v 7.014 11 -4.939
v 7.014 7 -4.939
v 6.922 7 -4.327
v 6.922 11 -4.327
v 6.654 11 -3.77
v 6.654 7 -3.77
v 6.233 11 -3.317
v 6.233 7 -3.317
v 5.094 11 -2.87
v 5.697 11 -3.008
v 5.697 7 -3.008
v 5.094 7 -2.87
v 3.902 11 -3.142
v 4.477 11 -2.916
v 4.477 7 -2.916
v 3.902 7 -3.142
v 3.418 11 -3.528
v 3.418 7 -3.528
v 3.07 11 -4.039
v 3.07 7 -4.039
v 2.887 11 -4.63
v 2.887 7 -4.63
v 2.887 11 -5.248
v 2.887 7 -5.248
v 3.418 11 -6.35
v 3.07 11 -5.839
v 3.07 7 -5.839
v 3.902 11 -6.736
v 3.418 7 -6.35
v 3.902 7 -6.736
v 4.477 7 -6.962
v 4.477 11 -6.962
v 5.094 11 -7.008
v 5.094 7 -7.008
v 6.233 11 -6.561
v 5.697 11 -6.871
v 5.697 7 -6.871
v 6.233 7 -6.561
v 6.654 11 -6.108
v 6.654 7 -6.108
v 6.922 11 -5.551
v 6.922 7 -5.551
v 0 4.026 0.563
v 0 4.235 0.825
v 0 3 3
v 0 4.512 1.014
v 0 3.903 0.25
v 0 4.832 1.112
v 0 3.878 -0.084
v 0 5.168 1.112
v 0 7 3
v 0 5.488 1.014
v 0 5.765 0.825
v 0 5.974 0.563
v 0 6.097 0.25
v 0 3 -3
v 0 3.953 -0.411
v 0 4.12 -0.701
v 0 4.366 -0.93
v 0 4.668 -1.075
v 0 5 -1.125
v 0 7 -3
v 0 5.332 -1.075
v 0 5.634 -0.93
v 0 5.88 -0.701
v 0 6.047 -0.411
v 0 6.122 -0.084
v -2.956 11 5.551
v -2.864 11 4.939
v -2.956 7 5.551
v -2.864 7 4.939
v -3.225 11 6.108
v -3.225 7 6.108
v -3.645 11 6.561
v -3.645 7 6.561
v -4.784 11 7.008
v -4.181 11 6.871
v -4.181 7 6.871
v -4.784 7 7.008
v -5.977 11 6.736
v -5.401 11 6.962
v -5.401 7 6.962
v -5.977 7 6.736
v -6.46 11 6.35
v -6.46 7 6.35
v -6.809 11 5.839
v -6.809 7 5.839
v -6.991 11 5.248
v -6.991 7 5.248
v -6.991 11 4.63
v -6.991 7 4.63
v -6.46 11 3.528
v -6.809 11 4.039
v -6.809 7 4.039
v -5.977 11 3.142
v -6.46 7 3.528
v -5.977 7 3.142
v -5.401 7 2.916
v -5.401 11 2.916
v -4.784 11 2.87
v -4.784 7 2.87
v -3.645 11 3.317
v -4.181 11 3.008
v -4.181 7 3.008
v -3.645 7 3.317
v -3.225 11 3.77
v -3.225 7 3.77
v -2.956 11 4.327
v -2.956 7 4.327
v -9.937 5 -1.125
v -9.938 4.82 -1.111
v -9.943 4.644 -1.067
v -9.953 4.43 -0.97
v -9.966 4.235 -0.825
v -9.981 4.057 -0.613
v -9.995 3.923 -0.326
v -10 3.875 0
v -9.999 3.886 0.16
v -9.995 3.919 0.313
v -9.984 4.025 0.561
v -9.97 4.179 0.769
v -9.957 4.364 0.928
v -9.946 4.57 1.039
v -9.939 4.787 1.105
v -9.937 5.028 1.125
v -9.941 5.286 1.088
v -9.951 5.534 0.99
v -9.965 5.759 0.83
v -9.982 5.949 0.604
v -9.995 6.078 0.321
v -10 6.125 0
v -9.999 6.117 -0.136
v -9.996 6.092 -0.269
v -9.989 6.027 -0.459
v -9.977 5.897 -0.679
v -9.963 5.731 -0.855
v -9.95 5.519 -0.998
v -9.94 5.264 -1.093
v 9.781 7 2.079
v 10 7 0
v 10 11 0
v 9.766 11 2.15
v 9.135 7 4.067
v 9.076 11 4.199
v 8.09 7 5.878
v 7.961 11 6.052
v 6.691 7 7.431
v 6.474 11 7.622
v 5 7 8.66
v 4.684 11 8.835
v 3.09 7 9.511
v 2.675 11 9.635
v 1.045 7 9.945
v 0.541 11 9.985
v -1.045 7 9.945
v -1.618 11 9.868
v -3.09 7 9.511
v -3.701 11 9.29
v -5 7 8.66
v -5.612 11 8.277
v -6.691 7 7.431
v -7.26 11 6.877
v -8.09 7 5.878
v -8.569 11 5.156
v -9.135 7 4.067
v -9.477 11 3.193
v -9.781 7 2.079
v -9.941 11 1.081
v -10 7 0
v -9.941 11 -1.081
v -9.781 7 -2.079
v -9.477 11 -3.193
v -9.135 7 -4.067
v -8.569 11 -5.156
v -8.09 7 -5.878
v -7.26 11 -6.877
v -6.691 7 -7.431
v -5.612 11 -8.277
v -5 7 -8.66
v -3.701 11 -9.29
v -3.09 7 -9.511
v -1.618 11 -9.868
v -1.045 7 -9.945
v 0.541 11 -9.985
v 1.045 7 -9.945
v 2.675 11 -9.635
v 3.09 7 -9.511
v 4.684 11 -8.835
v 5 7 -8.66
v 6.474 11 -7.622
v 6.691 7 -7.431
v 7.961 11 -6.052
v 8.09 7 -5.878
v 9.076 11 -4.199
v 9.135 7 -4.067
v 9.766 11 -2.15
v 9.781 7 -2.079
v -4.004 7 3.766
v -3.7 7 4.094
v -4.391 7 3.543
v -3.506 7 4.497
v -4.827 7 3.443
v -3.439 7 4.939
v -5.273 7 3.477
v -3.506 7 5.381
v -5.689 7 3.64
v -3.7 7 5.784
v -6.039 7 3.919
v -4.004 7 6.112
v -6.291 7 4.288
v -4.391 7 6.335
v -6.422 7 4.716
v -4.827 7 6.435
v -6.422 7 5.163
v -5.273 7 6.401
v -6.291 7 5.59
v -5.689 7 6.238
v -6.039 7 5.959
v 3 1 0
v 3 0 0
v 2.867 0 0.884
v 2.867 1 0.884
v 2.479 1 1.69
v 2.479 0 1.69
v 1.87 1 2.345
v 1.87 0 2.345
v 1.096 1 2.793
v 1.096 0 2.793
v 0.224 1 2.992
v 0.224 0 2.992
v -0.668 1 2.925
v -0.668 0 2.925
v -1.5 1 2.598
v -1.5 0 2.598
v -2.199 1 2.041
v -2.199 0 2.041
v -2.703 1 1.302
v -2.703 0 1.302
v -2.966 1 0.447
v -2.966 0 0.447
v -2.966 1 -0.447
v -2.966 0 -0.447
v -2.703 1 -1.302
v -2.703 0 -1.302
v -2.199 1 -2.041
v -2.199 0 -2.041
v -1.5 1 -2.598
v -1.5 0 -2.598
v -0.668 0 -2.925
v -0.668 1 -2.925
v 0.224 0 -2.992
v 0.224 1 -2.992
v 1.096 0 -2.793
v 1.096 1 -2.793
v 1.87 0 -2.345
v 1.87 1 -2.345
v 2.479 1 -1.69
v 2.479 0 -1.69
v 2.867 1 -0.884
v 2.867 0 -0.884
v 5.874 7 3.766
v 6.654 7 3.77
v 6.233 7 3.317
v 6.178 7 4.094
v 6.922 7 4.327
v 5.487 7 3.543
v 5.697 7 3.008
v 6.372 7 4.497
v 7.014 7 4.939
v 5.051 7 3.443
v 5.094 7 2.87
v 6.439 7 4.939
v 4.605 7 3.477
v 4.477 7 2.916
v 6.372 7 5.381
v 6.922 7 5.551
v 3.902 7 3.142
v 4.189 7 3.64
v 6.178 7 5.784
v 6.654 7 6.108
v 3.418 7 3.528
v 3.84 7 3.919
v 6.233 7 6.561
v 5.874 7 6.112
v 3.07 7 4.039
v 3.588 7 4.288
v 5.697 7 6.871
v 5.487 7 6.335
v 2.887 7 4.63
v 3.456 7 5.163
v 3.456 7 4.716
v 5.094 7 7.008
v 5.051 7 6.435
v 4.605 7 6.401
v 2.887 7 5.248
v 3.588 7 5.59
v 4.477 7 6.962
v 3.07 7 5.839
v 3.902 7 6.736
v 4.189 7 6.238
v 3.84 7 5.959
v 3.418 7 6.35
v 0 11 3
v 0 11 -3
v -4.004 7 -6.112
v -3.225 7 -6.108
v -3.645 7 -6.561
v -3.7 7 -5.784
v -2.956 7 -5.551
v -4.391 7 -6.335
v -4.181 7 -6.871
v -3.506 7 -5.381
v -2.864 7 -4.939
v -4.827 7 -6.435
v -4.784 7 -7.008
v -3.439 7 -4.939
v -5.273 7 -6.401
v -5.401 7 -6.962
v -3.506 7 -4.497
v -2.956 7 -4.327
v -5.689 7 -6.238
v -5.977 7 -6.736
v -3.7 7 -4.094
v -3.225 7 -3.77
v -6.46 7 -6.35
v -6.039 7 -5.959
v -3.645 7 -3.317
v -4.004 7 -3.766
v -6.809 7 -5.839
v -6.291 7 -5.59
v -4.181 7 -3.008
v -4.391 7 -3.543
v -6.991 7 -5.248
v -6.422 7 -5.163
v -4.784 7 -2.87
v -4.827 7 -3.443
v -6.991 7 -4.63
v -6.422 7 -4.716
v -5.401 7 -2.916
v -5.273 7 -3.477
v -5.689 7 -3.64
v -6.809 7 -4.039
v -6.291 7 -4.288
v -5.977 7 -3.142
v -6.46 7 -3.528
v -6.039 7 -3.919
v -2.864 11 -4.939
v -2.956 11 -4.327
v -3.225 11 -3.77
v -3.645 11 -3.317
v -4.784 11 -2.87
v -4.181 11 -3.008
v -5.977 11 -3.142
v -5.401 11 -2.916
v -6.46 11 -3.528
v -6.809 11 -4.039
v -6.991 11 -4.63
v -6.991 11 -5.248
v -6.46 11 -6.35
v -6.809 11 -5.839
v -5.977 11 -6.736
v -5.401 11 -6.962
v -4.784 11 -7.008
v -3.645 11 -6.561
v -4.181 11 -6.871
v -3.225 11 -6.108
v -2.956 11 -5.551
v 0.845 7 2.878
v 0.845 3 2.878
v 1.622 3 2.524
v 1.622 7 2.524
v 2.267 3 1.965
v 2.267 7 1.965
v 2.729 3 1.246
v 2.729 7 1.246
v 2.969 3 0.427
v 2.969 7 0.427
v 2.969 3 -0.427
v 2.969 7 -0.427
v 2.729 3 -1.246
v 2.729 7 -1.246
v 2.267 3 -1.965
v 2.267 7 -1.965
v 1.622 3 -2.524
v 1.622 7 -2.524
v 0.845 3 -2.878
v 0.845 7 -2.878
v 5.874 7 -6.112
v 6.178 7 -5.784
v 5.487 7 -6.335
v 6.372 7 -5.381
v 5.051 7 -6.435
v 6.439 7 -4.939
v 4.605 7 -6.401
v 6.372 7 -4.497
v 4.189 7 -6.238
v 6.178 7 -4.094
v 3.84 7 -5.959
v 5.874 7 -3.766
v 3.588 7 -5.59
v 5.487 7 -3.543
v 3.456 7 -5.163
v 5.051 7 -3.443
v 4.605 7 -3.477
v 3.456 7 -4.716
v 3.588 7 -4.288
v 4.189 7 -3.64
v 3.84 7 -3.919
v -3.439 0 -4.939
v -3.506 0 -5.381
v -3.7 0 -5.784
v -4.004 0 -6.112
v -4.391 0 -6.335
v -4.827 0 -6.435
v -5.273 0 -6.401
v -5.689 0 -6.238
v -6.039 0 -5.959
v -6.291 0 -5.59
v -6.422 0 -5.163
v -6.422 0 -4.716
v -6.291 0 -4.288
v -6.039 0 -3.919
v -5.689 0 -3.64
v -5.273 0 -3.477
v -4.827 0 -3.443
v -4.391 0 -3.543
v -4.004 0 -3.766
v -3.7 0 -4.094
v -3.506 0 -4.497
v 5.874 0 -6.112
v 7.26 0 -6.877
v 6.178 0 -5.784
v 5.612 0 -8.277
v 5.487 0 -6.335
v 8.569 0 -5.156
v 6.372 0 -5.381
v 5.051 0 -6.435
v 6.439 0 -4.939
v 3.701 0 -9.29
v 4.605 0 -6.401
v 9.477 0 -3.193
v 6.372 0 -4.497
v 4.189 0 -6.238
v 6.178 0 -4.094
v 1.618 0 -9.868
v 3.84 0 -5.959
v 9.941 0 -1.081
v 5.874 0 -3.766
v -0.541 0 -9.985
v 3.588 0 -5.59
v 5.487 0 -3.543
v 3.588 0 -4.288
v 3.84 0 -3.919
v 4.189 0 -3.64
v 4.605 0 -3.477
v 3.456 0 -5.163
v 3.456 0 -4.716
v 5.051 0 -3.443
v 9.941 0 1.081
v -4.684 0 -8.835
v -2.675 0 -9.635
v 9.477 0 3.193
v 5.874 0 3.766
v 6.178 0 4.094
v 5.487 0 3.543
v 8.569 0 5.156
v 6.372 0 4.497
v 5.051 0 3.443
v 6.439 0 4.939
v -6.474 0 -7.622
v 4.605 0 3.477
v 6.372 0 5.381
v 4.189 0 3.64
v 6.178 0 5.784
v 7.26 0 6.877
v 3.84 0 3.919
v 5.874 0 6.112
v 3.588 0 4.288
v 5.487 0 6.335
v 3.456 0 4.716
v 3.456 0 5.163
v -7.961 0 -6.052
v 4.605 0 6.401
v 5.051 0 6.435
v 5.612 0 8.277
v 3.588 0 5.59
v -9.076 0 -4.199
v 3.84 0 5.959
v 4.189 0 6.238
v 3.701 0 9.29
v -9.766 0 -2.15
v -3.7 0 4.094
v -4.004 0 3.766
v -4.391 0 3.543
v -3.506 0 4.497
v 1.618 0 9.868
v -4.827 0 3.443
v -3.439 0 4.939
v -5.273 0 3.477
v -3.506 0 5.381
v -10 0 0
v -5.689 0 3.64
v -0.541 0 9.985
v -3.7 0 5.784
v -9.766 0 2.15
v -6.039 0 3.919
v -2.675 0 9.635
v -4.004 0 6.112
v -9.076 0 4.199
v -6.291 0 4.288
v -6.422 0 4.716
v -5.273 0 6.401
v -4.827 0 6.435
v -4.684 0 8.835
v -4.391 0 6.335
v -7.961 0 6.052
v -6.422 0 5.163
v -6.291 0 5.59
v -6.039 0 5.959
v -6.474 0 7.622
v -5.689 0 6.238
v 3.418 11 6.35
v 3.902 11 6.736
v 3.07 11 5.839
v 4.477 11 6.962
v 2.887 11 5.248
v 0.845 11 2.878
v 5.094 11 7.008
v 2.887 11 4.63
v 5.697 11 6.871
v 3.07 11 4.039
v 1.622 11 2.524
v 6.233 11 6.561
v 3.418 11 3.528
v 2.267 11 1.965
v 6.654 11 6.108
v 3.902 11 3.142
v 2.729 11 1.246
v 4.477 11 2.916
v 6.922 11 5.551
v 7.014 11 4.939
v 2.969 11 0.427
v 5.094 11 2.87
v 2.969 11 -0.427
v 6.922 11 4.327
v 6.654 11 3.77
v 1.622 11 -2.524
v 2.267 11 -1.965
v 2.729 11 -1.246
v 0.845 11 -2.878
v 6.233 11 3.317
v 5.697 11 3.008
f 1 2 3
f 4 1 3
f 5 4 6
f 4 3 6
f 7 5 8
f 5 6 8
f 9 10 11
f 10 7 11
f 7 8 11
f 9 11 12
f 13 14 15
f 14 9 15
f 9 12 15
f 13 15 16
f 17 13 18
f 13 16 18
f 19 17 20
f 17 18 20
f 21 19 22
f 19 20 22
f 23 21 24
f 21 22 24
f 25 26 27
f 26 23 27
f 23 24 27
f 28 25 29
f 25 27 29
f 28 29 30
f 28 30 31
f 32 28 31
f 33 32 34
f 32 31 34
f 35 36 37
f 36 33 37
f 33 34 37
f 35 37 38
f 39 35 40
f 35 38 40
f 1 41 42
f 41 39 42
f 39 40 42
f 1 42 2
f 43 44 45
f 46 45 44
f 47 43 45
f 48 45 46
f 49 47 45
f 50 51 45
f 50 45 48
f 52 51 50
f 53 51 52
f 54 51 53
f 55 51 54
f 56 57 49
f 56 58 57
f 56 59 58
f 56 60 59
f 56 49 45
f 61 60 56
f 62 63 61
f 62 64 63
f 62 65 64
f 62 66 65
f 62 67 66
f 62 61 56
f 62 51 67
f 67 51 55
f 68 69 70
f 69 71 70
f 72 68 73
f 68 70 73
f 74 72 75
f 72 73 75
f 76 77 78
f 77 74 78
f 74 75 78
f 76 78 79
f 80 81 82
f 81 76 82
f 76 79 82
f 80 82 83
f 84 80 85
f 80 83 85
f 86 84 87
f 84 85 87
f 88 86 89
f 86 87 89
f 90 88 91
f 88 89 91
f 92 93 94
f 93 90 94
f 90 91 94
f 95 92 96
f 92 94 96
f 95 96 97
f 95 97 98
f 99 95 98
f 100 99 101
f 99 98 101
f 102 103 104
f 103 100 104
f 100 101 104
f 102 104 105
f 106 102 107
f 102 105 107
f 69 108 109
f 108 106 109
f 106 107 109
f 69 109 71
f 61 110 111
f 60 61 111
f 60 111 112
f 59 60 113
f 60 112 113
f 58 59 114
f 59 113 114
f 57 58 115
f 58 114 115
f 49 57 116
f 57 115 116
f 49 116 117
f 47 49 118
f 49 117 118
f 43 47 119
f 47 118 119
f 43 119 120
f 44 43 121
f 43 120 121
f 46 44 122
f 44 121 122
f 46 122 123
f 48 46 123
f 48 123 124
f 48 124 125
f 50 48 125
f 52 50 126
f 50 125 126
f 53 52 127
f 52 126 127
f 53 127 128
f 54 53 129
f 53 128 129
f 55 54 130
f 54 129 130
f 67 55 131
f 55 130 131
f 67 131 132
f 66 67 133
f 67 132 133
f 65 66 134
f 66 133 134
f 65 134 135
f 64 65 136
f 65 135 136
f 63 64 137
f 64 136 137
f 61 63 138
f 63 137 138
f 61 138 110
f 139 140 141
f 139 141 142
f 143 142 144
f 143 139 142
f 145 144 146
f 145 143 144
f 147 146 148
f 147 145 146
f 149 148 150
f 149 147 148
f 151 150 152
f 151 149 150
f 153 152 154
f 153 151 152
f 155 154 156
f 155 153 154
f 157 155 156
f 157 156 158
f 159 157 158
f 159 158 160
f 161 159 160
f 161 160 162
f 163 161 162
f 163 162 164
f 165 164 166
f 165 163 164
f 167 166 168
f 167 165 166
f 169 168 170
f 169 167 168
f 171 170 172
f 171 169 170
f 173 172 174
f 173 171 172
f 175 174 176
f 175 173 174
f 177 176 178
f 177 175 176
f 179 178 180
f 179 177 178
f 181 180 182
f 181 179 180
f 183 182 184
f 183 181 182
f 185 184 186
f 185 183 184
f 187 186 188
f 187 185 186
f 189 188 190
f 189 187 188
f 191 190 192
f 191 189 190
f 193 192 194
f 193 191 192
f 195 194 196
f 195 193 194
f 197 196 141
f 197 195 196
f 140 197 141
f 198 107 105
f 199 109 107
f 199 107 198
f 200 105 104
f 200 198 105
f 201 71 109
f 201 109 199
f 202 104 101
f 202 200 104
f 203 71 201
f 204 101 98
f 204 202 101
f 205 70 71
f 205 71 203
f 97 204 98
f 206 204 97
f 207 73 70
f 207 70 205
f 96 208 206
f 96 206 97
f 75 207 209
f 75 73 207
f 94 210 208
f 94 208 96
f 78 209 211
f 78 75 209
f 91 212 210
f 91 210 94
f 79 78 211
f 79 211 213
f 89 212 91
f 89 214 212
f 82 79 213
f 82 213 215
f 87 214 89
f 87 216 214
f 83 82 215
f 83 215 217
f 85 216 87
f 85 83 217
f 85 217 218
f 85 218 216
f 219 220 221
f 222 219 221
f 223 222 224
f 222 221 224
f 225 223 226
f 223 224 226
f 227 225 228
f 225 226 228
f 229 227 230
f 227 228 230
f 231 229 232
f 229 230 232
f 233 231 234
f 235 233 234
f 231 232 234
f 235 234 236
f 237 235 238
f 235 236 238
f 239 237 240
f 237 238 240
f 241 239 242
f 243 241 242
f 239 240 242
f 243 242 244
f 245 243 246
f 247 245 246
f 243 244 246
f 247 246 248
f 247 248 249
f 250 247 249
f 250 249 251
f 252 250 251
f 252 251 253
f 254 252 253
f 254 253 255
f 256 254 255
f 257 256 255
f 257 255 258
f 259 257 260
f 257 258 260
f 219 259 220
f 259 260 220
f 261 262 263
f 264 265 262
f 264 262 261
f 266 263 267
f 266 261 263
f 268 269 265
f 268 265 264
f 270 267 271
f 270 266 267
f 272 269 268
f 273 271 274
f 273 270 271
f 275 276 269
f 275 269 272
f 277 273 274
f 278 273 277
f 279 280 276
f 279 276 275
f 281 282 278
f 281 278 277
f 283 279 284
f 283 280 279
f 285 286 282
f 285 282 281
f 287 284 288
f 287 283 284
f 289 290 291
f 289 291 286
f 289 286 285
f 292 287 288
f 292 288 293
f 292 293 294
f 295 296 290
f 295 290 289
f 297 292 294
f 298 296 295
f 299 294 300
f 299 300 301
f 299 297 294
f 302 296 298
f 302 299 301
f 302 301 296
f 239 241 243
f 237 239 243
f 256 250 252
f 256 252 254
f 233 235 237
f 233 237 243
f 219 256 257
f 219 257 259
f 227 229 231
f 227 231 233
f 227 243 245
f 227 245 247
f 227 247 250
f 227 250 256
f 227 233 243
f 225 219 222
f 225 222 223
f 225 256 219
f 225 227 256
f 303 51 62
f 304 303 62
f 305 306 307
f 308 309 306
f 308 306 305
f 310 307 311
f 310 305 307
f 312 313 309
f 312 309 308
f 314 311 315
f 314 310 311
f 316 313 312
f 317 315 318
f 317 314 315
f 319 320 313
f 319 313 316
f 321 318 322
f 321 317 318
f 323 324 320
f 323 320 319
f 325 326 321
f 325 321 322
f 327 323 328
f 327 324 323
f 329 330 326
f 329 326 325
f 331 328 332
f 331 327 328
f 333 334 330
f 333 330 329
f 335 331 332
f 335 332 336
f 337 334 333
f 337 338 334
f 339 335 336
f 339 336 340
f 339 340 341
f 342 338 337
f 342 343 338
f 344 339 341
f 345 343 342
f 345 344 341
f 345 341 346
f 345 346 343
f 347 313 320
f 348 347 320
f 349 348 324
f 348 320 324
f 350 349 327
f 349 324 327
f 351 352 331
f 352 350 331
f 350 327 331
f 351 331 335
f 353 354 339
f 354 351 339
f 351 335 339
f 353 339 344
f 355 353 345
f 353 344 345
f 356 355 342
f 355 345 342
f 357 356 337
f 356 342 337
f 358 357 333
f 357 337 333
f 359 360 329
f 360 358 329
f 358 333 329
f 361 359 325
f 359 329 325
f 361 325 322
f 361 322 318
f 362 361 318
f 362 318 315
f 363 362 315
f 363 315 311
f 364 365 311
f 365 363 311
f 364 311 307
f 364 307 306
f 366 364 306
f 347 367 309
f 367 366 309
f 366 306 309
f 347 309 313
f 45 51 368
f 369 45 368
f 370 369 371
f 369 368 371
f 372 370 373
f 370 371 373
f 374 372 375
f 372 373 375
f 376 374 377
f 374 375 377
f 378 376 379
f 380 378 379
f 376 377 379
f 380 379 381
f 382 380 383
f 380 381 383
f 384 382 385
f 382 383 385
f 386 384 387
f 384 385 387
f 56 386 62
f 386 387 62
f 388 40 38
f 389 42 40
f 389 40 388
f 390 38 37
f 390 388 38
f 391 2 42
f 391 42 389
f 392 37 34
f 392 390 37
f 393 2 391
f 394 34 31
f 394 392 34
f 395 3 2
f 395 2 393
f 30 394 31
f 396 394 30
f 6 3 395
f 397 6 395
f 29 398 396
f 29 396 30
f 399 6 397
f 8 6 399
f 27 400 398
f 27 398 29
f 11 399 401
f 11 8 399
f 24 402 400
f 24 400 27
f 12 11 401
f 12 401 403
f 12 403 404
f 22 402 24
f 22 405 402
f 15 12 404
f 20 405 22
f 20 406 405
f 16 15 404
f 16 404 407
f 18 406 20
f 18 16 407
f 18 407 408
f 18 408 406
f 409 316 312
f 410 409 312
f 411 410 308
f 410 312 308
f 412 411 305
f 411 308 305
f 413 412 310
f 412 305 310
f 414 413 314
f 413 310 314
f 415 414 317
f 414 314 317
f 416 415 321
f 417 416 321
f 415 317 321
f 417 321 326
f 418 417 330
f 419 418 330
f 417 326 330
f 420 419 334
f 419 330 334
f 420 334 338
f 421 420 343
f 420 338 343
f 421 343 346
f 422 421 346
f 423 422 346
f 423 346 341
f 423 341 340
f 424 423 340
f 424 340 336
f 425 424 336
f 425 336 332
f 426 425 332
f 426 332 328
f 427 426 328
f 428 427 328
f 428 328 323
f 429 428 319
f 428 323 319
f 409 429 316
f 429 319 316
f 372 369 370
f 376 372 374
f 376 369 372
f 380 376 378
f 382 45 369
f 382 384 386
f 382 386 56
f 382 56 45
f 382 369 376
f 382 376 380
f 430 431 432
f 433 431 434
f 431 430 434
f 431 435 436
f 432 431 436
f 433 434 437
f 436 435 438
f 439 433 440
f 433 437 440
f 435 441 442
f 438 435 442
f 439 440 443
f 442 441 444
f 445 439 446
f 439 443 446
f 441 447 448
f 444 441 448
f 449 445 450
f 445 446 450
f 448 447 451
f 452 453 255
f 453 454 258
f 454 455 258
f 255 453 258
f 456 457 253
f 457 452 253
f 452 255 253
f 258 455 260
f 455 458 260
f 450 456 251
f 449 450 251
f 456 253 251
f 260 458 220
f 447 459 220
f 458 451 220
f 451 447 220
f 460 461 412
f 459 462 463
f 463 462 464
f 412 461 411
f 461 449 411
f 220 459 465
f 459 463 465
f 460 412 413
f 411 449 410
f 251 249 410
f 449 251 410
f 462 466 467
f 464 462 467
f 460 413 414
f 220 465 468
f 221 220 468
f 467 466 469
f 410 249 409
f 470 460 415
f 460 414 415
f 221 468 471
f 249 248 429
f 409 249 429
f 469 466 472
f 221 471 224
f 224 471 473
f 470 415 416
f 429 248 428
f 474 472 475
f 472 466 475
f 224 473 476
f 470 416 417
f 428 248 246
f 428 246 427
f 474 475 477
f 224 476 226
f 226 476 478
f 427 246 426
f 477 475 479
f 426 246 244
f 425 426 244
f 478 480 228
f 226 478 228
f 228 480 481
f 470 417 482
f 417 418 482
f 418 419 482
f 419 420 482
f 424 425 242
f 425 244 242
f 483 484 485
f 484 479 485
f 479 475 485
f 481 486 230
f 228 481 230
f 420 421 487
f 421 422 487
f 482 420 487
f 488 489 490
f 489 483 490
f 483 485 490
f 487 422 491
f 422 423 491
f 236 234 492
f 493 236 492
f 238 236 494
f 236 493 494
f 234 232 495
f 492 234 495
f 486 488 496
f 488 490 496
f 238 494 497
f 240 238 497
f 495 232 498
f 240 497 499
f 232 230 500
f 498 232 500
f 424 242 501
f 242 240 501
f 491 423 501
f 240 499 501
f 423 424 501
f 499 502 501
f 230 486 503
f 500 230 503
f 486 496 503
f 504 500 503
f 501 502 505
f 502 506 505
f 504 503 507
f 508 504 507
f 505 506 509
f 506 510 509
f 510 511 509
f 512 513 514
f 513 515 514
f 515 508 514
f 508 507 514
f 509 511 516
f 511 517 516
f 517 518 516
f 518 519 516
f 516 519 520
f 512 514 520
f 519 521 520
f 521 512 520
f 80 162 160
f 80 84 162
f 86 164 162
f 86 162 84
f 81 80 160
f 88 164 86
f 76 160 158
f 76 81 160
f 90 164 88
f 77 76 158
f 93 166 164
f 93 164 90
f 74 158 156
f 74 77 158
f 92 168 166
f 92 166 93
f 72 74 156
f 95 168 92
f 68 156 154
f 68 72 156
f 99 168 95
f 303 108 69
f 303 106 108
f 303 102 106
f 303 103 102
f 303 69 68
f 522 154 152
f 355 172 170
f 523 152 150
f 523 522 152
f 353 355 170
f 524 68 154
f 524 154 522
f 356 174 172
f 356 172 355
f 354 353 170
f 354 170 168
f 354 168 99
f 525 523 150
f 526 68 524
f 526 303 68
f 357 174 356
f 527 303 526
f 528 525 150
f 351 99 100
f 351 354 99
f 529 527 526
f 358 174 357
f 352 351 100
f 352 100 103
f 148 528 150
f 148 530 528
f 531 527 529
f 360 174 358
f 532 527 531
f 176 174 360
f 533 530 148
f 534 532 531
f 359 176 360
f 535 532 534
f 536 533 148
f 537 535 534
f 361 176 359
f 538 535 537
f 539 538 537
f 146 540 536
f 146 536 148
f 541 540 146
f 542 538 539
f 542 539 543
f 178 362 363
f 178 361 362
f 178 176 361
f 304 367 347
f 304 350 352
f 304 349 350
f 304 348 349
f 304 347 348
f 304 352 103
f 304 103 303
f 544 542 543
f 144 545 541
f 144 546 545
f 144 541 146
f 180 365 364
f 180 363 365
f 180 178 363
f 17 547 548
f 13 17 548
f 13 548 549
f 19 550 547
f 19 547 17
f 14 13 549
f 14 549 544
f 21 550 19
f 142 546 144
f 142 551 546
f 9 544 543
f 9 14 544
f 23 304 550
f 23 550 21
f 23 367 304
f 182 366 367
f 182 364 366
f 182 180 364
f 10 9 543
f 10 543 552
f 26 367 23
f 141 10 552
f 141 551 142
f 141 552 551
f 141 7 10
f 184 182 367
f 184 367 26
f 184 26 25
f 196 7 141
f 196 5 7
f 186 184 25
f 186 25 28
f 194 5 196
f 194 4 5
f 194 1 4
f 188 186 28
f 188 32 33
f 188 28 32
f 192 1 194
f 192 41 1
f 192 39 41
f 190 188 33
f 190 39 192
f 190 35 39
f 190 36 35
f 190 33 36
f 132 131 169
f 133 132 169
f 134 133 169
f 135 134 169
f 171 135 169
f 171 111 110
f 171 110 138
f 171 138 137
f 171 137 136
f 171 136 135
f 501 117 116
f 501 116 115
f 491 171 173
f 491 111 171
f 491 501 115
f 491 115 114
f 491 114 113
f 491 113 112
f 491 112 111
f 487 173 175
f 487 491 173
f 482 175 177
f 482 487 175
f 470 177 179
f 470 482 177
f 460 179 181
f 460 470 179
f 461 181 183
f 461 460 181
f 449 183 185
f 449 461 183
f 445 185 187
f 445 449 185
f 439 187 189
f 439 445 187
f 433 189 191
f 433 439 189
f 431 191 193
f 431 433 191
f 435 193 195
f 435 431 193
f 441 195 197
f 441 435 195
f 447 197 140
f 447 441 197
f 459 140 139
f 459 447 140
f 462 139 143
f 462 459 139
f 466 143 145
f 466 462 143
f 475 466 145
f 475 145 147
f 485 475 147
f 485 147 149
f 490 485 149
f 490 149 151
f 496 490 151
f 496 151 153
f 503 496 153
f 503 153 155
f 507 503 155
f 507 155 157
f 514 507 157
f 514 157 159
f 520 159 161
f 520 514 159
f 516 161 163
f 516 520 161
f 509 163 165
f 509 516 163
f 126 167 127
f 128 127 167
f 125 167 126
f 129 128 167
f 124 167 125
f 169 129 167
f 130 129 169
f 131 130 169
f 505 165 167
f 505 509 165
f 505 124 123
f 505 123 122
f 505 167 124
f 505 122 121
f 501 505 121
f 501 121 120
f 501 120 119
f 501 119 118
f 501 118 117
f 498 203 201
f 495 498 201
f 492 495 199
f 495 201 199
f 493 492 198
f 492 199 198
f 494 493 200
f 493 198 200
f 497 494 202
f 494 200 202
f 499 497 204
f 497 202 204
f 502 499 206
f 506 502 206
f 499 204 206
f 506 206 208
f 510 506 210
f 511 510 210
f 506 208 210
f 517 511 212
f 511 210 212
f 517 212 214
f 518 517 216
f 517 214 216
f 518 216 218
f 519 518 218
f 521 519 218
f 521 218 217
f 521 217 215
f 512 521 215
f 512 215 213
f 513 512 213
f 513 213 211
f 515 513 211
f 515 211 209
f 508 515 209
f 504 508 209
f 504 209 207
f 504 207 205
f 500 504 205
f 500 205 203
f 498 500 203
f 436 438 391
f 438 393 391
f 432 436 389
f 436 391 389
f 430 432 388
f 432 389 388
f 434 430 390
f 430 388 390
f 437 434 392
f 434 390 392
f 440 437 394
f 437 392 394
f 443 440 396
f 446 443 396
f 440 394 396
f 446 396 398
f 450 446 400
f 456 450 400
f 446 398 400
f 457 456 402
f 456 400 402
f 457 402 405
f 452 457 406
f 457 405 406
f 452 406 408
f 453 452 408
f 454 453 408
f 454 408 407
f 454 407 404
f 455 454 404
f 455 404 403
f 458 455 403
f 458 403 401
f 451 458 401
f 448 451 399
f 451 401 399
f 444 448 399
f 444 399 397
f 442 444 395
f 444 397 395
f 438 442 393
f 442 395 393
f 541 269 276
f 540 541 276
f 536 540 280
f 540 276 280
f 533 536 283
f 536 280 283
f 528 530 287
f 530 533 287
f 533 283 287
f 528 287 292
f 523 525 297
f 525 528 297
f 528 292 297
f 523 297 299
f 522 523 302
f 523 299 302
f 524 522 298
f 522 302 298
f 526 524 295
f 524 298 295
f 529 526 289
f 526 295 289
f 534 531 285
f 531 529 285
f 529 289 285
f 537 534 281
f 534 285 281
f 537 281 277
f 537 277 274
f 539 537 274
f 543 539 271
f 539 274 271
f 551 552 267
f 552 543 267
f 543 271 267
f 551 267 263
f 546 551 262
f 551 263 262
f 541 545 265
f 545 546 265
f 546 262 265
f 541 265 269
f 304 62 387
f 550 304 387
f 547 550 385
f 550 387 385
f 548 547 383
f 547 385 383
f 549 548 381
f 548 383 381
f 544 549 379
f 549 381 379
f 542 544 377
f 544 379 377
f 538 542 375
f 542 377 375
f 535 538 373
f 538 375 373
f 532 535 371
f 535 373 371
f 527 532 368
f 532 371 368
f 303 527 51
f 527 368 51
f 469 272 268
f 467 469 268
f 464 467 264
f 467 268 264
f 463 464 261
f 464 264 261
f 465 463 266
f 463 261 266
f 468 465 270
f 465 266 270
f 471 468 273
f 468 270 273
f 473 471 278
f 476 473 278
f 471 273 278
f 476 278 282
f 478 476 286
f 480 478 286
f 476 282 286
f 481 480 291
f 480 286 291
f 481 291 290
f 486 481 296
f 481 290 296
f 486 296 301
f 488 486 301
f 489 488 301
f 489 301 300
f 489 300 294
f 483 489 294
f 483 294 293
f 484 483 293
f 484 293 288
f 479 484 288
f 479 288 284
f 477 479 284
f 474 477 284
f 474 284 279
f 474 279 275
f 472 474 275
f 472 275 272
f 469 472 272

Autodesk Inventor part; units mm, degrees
ref_plane "YZ Plane" through (0, 0, 0) normal (1, 0, 0) x (0, 1, 0)
ref_plane "XZ Plane" through (0, 0, 0) normal (0, 1, 0) x (-1, 0, 0)
sketch "Sketch1" plane through (0, 0, 0) normal (0, 1, 0) x (-1, 0, 0)
  circle A0 centre (0, 0) radius 10
  dimension "d0" = 20
extrude "Extrusion1" add sketch "Sketch1" along normal blind 7
sketch "Sketch2" plane through (0, 7, 0) normal (0, 1, 0) x (1, 0, 0)
  circle A0 centre (0, 0) radius 10
  arc A1 (0, -3) -> (0, 3) centre (0, 0) ccw
  line L0 (0, -3) -> (0, 3)
  dimension "d3" = 6
extrude "Extrusion2" cut sketch "Sketch2" against normal blind 4 contours L0 A1
sketch "Sketch3" plane through (0, 0, 0) normal (0, -1, 0) x (1, 0, 0)
  line L0 (0, 3) -> (0, -3) projected
  circle A0 centre (0, 0) radius 3
extrude "Extrusion3" cut sketch "Sketch3" against normal blind 1
ref_plane "Work Plane1" through (-10, 0, 0) normal (1, 0, 0) x (0, 0, -1)
sketch "Sketch4" plane through (-10, 0, 0) normal (1, 0, 0) x (0, 0, -1)
  line L0 (10, 7) -> (-10, 7) projected
  circle A0 centre (0, 5) radius 1.125
  point P0 (0, 0)
  dimension "d9" = 2.25
extrude "Extrusion4" cut sketch "Sketch4" along normal up to surface (10 mm away)
sketch "Sketch5" plane through (0, 7, 0) normal (0, 1, 0) x (1, 0, 0)
  circle A0 centre (0, 0) radius 6.985
  line L0 (0, 0) -> (6.985, 0) construction
  circle A1 centre (-4.9391, 4.9391) radius 1.5
  circle A2 centre (-4.9391, -4.9391) radius 1.5
  circle A3 centre (4.9391, -4.9391) radius 1.5
  circle A4 centre (4.9391, 4.9391) radius 1.5
  dimension "d14" = 3
  dimension "d17" = 360
extrude "Extrusion5" cut sketch "Sketch5" against normal up to surface (7 mm away) contours A4 A0 | A0 A4 | A3 A0 | A0 A3 | A1 A0 | A0 A1 | A2 A0 | A0 A2
sketch "Sketch6" plane through (0, 7, 0) normal (0, 1, 0) x (1, 0, 0)
  circle A0 centre (0, 0) radius 10
  circle A1 centre (-4.9391, 4.9391) radius 1.5 projected
  circle A2 centre (-4.9391, 4.9391) radius 1.5
  circle A3 centre (4.9391, 4.9391) radius 1.5 projected
  circle A4 centre (4.9391, 4.9391) radius 1.5
  circle A5 centre (4.9391, -4.9391) radius 1.5 projected
  circle A6 centre (4.9391, -4.9391) radius 1.5
  circle A7 centre (-4.9391, -4.9391) radius 1.5 projected
  circle A8 centre (-4.9391, -4.9391) radius 1.5
  circle A9 centre (-4.9391, -4.9391) radius 2.075
  circle A10 centre (4.9391, -4.9391) radius 2.075
  circle A11 centre (4.9391, 4.9391) radius 2.075
  circle A12 centre (-4.9391, 4.9391) radius 2.075
  line L0 (0, -3) -> (0, 3) projected
  arc A13 (0, -3) -> (0, 3) centre (0, 0) ccw
  arc A14 (0, -3) -> (0, 3) centre (0, 0) ccw projected
  line L1 (0, -3) -> (0, 3)
  dimension "d21" = 4.15
extrude "Extrusion6" add sketch "Sketch6" along normal blind 4 contours A0
equation "\"d19\" = d14"
properties part number "Twist_Attachment_To_Servo_Horn"
